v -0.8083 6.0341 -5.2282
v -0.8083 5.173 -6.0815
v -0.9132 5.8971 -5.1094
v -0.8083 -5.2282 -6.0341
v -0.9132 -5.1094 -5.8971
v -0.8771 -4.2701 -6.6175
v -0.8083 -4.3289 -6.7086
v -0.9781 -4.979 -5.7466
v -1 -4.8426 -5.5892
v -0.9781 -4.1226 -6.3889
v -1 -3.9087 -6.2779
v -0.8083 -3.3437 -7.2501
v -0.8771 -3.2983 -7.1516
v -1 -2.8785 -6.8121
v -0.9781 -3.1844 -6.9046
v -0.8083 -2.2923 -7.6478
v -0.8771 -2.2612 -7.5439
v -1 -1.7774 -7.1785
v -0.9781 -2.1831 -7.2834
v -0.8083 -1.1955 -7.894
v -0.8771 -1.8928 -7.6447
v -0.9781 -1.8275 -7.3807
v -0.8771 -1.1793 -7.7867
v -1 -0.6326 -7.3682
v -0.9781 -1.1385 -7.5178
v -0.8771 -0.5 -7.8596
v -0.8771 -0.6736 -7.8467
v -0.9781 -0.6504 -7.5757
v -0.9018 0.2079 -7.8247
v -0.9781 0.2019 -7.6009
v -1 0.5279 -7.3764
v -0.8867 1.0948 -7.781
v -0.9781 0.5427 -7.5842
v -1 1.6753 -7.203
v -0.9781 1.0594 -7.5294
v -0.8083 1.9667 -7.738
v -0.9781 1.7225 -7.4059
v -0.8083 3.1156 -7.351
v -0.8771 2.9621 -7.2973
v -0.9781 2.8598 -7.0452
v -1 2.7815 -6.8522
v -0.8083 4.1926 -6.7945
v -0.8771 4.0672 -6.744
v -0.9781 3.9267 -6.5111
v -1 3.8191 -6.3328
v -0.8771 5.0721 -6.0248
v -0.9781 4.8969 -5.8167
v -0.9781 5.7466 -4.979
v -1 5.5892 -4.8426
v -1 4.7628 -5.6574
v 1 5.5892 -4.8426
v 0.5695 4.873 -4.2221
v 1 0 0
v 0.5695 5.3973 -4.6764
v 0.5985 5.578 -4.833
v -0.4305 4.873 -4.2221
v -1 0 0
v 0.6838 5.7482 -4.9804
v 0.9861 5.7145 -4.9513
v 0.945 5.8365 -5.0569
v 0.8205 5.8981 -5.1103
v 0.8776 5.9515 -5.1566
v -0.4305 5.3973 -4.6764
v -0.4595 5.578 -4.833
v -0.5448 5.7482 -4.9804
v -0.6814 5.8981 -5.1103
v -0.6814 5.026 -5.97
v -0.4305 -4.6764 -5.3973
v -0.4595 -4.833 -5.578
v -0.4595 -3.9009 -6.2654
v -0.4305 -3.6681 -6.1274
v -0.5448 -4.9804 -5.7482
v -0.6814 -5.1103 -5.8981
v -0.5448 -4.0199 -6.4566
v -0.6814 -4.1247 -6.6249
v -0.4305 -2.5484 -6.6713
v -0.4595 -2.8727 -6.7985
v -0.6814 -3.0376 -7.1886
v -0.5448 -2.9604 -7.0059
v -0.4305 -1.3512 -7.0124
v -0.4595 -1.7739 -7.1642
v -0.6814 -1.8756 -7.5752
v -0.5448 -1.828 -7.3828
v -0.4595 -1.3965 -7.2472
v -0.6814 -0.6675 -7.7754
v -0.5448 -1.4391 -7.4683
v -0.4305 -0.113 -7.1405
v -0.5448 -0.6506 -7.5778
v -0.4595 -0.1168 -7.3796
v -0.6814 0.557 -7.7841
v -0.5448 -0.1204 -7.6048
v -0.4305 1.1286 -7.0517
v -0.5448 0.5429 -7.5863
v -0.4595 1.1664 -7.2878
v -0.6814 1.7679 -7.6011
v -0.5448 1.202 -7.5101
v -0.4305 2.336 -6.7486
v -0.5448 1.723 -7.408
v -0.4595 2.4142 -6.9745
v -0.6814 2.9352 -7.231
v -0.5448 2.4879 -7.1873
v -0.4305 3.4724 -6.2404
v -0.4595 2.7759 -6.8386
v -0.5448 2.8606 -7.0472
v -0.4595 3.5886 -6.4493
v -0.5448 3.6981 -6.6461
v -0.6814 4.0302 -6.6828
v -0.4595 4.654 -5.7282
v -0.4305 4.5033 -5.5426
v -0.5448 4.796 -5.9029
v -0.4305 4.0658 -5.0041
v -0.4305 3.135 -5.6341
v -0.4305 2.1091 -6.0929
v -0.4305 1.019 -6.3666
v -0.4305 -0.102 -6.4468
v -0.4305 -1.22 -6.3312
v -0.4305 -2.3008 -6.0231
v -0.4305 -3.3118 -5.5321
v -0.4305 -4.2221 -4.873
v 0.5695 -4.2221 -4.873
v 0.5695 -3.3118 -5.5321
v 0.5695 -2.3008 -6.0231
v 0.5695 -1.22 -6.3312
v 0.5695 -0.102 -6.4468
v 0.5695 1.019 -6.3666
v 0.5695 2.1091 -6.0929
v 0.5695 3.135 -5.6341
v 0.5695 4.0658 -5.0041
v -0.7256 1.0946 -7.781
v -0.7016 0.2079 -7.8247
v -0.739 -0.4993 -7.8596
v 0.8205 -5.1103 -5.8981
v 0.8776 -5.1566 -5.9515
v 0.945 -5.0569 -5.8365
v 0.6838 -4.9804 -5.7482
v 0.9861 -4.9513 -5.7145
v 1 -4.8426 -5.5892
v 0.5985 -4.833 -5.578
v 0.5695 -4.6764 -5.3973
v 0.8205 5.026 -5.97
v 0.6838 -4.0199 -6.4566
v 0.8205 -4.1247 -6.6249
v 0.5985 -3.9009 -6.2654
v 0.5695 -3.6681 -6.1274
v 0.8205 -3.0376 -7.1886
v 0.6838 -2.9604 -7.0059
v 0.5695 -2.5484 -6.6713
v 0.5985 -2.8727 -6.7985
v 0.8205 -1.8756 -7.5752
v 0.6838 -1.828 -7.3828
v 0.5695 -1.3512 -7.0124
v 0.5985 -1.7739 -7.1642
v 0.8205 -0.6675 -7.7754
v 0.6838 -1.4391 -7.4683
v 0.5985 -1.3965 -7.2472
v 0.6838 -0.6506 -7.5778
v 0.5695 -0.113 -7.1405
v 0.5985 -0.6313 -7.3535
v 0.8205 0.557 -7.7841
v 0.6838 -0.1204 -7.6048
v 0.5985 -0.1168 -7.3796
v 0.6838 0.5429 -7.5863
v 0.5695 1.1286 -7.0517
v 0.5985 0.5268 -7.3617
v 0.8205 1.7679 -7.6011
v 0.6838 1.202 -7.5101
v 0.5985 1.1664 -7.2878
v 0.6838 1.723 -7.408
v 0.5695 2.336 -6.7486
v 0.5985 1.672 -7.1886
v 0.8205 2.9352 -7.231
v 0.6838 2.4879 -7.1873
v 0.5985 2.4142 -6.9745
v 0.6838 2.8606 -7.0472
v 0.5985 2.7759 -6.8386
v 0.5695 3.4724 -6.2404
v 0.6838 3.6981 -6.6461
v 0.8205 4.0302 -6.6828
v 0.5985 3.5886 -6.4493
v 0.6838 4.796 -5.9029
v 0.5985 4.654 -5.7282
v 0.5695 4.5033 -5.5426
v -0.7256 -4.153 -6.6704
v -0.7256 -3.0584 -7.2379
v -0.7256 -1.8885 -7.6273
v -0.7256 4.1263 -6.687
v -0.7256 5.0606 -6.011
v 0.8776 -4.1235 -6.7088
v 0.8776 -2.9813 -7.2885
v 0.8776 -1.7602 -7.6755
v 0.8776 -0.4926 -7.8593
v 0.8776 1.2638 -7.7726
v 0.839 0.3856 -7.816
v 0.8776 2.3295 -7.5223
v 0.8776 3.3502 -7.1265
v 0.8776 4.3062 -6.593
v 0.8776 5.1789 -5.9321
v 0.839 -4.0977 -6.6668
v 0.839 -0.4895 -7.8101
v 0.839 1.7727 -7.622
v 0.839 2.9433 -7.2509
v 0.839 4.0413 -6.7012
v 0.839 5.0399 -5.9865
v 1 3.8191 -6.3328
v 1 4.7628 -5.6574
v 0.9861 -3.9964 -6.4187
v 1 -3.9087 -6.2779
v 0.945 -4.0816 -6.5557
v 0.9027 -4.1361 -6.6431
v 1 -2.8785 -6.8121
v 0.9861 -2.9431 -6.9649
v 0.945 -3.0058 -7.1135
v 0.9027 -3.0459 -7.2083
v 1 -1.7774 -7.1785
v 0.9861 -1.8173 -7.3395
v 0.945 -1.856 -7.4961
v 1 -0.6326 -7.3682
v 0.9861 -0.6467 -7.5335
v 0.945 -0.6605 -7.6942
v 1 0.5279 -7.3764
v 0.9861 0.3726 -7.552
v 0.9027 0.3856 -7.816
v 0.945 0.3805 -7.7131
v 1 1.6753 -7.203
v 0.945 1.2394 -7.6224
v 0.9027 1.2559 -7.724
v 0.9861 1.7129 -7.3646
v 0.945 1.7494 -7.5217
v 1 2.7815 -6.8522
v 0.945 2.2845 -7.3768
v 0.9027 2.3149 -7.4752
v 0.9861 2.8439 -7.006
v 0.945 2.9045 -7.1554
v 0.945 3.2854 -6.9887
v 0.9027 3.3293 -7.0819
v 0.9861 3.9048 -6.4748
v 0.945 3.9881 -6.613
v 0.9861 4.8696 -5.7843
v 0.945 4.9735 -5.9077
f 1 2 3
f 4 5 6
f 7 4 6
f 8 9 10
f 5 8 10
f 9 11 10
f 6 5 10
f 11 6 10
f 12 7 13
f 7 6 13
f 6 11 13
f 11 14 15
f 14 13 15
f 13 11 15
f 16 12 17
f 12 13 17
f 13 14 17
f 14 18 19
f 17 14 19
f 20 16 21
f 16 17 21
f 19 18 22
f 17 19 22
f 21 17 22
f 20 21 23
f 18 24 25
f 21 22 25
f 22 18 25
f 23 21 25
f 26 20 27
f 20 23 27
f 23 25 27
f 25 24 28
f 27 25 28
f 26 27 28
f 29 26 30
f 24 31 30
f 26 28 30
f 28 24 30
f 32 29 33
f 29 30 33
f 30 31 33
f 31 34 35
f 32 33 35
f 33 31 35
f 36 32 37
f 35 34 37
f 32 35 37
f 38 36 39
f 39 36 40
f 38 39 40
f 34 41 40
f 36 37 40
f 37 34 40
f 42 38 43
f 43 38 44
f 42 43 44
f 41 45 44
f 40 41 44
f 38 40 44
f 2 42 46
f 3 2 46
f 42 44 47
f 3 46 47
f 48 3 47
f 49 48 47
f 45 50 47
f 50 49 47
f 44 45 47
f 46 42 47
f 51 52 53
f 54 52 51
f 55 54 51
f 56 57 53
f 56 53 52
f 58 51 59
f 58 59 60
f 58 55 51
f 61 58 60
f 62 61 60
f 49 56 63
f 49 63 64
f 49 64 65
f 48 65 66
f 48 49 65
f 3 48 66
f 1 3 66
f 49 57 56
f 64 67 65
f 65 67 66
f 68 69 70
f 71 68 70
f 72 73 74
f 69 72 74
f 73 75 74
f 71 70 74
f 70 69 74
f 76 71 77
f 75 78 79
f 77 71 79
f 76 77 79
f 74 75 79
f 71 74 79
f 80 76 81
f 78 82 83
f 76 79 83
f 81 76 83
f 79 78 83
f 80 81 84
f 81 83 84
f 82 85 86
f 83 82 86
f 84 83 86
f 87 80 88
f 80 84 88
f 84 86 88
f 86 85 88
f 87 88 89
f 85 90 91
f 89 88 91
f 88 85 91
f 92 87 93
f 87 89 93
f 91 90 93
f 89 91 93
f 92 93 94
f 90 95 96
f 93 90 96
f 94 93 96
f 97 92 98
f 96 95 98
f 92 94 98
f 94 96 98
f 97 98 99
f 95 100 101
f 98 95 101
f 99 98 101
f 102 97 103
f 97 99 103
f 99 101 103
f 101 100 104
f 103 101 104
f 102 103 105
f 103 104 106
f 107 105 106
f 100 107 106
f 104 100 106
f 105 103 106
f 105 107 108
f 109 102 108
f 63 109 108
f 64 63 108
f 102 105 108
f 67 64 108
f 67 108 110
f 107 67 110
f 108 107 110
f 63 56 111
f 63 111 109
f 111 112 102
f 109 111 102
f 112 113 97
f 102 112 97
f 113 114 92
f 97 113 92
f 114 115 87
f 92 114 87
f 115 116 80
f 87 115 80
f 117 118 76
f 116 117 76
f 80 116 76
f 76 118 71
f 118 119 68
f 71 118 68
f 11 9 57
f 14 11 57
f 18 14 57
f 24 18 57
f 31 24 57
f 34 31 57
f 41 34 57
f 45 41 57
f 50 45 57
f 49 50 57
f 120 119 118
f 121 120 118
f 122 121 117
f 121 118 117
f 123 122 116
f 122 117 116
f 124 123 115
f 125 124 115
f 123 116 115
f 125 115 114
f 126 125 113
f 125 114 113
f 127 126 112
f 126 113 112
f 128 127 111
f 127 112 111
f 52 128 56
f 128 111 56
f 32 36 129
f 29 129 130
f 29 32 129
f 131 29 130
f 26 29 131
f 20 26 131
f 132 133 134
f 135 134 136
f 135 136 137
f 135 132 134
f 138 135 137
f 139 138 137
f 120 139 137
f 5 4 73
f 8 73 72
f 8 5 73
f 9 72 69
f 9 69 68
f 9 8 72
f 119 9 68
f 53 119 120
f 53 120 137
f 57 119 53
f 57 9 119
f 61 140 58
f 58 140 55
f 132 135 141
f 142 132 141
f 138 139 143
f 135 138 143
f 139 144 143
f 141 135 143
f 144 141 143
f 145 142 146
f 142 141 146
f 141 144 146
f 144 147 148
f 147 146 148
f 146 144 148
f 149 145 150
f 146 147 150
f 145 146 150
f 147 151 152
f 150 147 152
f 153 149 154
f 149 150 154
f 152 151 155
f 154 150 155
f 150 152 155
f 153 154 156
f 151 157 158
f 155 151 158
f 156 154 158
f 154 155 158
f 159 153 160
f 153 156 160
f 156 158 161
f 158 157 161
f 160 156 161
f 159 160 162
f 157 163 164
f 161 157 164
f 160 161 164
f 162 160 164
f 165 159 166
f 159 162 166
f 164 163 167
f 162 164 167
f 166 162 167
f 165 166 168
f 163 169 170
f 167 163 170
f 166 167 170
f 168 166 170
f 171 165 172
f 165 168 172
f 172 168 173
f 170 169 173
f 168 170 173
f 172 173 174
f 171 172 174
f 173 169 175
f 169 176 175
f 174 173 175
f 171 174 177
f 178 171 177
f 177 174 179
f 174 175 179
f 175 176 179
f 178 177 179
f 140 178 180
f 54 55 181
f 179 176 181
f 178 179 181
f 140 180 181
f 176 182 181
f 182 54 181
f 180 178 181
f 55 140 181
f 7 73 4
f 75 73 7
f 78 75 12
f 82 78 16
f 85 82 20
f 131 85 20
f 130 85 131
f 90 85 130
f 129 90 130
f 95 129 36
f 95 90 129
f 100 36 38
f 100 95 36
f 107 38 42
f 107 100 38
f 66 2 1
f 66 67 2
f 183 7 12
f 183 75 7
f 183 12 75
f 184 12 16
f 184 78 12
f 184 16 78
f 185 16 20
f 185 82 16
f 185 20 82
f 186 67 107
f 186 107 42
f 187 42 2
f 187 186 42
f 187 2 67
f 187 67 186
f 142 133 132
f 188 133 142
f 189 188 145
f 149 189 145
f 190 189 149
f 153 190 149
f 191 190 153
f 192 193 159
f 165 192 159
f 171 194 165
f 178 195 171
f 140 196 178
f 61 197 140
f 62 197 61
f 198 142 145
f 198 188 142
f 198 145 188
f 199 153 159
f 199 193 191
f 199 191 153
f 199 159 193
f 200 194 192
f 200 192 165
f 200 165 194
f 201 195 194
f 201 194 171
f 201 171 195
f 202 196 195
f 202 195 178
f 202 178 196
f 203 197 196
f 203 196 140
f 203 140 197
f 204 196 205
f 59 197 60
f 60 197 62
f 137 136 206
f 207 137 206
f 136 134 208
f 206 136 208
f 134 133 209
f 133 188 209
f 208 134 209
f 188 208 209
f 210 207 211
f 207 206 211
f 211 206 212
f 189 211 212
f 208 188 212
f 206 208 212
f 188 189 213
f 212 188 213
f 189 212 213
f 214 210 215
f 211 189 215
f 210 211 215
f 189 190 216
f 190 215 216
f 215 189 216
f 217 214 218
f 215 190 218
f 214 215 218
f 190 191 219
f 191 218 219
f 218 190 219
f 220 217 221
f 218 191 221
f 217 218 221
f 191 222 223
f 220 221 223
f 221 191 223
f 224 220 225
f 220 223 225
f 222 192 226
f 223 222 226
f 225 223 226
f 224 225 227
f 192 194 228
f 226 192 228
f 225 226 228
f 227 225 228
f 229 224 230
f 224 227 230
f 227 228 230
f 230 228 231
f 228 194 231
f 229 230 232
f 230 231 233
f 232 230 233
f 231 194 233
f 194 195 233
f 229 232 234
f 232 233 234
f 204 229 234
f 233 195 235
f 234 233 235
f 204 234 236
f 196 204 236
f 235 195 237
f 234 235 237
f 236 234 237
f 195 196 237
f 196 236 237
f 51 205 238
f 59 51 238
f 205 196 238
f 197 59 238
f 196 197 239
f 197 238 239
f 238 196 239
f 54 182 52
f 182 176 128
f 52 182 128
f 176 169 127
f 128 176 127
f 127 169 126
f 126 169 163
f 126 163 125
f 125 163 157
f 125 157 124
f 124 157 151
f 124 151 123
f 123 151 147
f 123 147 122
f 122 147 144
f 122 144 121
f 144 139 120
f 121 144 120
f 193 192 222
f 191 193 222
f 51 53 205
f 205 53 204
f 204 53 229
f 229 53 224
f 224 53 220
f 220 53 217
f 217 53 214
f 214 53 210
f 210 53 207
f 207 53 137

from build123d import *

# Parameters (mm, degrees)
CUT_EXTRUDE1_DEPTH      = 12.33524834
CUT_EXTRUDE1_DEPTH_BACK = 12.33524834
SKETCH3_OUTSIDE_W       = 22.502
SKETCH3_OUTSIDE_H       = 22.502


with BuildPart() as part:
    # Sketch2 → Revolve1 (revolve)
    with BuildSketch(Plane(origin=(0, 0, 0), x_dir=(1, 0, 0), z_dir=(0, 1, 0)), mode=Mode.PRIVATE) as revolve1_sk:
        with BuildLine():
            Line((-1, 0), (1, 0))
            Line((1, 0), (1, 5.5))
            Line((1, 5.5), (1, 7.395254938))
            ThreePointArc((1, 7.395254938), (0.968908672, 7.642673583), (0.877568029, 7.874707079))
            add(Edge.make_bspline(
                [(0.820511391, 7.803982399), (0.850646042, 7.838050546), (0.877568029, 7.874707079)],
                knots=[2.4177114, 2.4177114, 2.4177114, 2.508439234, 2.508439234, 2.508439234], degree=2, weights=[1, 0.998971234, 1]))
            ThreePointArc((0.820511391, 7.803982399), (0.634382255, 7.495682579), (0.569535838, 7.14144004))
            Line((0.569535838, 7.14144004), (0.569535838, 6.447627469))
            Line((0.569535838, 6.447627469), (-0.430464162, 6.447627469))
            Line((-0.430464162, 6.447627469), (-0.430464162, 7.14144004))
            ThreePointArc((-0.430464162, 7.14144004), (-0.495310579, 7.495682579), (-0.681439715, 7.803982399))
            add(Edge.make_bspline(
                [(-0.80833384, 7.983979325), (-0.754845236, 7.886969591), (-0.681439715, 7.803982399)],
                knots=[0.503618874, 0.503618874, 0.503618874, 0.723881254, 0.723881254, 0.723881254], degree=2, weights=[1, 0.993941688, 1]))
            ThreePointArc((-0.80833384, 7.983979325), (-0.950876921, 7.704824123), (-1, 7.395254938))
            Line((-1, 7.395254938), (-1, 5.5))
            Line((-1, 5.5), (-1, 0))
        make_face()
    revolve(revolve1_sk.sketch.rotate(Axis((0, 0, 0), (1, 0, 0)), 180), axis=Axis((0, 0, 0), (1, 0, 0)))

    # Sketch3 outside → Cut-Extrude1 (cut, two sides: drawn at the far end of the back side and taken through both)
    with BuildSketch(Plane(origin=(0, 0, 0), x_dir=(0, 0, -1), z_dir=(1, 0, 0)).offset(-CUT_EXTRUDE1_DEPTH_BACK)):
        Rectangle(SKETCH3_OUTSIDE_W, SKETCH3_OUTSIDE_H)
        Polygon((0, 0), (7.412882699, 8.555619308), (8.184858407, -7.091642708), align=None, mode=Mode.SUBTRACT)
    extrude(amount=CUT_EXTRUDE1_DEPTH + CUT_EXTRUDE1_DEPTH_BACK, mode=Mode.SUBTRACT)


solid = part.part
